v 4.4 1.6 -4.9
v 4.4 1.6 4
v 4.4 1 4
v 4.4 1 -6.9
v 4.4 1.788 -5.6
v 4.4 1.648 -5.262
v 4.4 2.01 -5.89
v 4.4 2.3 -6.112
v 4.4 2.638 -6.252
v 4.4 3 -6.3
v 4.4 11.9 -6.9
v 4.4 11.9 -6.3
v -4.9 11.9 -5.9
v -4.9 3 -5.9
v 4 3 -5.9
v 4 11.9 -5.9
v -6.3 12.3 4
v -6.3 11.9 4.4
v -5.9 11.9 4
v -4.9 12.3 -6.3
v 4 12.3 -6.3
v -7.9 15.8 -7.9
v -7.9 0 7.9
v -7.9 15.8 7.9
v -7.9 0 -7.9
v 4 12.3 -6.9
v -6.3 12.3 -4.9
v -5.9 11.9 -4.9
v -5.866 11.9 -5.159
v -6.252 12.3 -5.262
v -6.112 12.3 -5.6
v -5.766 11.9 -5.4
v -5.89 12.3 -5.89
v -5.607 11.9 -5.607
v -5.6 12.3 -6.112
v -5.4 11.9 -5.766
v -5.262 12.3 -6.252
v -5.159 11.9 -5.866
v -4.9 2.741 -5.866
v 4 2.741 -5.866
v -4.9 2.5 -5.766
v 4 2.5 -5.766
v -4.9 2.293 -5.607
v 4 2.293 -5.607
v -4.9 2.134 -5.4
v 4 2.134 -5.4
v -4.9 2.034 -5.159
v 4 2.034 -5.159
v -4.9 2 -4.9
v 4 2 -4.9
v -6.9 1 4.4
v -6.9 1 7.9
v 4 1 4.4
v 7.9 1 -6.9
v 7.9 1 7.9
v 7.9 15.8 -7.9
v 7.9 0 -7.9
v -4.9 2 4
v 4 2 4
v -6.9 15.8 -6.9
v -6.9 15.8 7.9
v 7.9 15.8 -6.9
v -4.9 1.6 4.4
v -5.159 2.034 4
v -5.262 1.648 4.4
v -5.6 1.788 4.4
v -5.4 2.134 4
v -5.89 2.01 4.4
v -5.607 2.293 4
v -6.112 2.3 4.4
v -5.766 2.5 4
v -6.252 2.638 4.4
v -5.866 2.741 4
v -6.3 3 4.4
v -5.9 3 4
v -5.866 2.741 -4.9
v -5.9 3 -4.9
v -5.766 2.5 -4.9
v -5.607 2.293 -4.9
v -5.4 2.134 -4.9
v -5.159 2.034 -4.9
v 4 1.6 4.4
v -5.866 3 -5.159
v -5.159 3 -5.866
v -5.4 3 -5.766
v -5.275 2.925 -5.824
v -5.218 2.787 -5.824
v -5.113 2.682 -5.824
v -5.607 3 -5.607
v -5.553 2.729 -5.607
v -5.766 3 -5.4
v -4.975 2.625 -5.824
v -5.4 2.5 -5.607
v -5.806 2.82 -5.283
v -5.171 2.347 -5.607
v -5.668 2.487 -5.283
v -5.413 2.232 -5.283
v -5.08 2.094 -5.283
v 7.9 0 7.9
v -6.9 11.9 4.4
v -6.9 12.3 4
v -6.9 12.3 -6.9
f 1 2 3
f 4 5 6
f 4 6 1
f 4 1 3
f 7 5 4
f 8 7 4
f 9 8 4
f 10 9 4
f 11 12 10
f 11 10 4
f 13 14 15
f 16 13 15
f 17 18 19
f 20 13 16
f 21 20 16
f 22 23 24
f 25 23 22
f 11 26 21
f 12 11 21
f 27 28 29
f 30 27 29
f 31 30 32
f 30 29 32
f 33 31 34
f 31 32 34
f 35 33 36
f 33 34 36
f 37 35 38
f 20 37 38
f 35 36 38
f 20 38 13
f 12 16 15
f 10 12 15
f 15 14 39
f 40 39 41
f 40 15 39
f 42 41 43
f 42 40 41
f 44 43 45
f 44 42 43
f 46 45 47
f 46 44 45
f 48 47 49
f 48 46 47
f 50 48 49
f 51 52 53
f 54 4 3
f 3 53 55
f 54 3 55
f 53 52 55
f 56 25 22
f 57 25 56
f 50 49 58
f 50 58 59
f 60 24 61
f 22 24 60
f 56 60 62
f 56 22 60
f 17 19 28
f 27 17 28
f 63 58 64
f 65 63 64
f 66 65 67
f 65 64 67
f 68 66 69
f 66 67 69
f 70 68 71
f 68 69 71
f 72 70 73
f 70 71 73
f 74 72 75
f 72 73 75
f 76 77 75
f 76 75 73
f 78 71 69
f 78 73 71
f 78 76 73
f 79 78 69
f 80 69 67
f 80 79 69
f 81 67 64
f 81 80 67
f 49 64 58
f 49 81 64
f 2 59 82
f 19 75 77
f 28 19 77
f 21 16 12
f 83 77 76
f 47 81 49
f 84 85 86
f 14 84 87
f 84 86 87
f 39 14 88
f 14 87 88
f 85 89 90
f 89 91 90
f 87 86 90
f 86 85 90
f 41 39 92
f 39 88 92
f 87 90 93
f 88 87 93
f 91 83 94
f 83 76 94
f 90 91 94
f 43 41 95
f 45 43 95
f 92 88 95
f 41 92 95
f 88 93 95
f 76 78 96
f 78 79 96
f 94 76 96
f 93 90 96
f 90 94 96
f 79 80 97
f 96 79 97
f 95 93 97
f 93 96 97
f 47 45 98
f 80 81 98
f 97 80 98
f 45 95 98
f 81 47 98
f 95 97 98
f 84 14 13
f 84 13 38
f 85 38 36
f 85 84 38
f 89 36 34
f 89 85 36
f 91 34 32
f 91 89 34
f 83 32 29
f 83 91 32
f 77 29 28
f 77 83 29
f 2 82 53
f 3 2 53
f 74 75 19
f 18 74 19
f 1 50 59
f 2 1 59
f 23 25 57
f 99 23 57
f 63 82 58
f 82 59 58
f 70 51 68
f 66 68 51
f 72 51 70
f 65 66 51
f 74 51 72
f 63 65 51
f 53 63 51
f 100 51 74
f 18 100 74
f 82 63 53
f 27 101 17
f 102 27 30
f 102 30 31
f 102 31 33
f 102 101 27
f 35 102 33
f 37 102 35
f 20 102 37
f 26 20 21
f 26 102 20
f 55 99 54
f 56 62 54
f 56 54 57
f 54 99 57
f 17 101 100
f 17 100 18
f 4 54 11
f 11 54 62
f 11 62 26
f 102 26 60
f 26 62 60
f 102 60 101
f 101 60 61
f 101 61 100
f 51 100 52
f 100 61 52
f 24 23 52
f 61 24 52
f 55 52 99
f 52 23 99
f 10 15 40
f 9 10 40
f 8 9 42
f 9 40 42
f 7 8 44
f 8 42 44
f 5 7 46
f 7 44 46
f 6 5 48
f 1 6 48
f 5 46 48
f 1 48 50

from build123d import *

# Parameters (mm, degrees)
ESQUISSE1_W                  = 15.8
ESQUISSE1_H                  = 15.8
BOSS_EXTRU_1_DEPTH           = 15.8
COQUE1_T                     = -2
ENL_V_MAT_EXTRU_1_DEPTH      = 3.5
ENL_V_MAT_EXTRU_2_DEPTH      = 3.5
ENL_V_MAT_EXTRU_3_DEPTH      = 24.7
ENL_V_MAT_EXTRU_3_DEPTH_BACK = 3.5
CONG_1_R                     = 1
CHANFREIN1_SIZE              = 0.4


with BuildPart() as part:
    # Esquisse1 → Boss.-Extru.1 (new body)
    with BuildSketch(Plane(origin=(0, 0, 0), x_dir=(1, 0, 0), z_dir=(0, 1, 0))):
        Rectangle(ESQUISSE1_W, ESQUISSE1_H)
    extrude(amount=BOSS_EXTRU_1_DEPTH)

    # Coque1
    coque1_openings = [part.faces().sort_by_distance(p)[0] for p in [
        (0, 15.8, 0),
        (0, 7.9, 7.9),
        (7.9, 7.9, 0),
    ]]
    offset(amount=COQUE1_T, openings=coque1_openings, kind=Kind.INTERSECTION)

    # Esquisse2 → Enlèv. mat.-Extru.1 (cut)
    with BuildSketch(Plane.XY.offset(7.9)):
        Polygon((-5.9, 15.8), (-6.9, 15.8), (-6.9, 1), (7.9, 1), (7.9, 2), (-5.9, 2), align=None)
    extrude(amount=-ENL_V_MAT_EXTRU_1_DEPTH, mode=Mode.SUBTRACT)

    # Esquisse6 → Enlèv. mat.-Extru.2 (cut)
    with BuildSketch(Plane(origin=(0, 15.8, 0), x_dir=(1, 0, 0), z_dir=(0, 1, 0))):
        Polygon((-5.9, -4.4), (-5.9, 5.9), (7.9, 5.9), (7.9, 6.9), (-6.9, 6.9), (-6.9, -4.4), align=None)
    extrude(amount=-ENL_V_MAT_EXTRU_2_DEPTH, mode=Mode.SUBTRACT)

    # Esquisse7 → Enlèv. mat.-Extru.3 (cut, two sides: drawn at the far end of the back side and taken through both)
    with BuildSketch(Plane(origin=(7.9, 0, 0), x_dir=(0, 0, -1), z_dir=(1, 0, 0)).offset(-ENL_V_MAT_EXTRU_3_DEPTH_BACK)):
        Polygon((5.9, 2), (-4.4, 2), (-4.4, 1), (6.9, 1), (6.9, 12.3), (5.9, 12.3), align=None)
    extrude(amount=ENL_V_MAT_EXTRU_3_DEPTH + ENL_V_MAT_EXTRU_3_DEPTH_BACK, mode=Mode.SUBTRACT)

    # Congé1
    cong_1_edges = [part.edges().sort_by_distance(p)[0] for p in [
        (-5.9, 2, -0.75),
        (-5.9, 7.15, -5.9),
        (-0.75, 2, -5.9),
    ]]
    fillet(cong_1_edges, radius=CONG_1_R)

    # Chanfrein1
    chanfrein1_edges = [part.edges().sort_by_distance(p)[0] for p in [
        (-5.9, 7.65, 4.4),
        (-6.4, 12.3, 4.4),
        (-5.9, 12.3, -0.25),
        (-0.25, 2, 4.4),
        (4.4, 2, -0.25),
        (4.4, 12.3, -6.4),
        (4.4, 1.5, 4.4),
        (4.4, 7.65, -5.9),
        (-0.25, 12.3, -5.9),
        (-5.607106781, 12.3, -5.607106781),
        (4.4, 2.292893219, -5.607106781),
        (-5.607106781, 2.292893219, 4.4),
    ]]
    chamfer(chanfrein1_edges, length=CHANFREIN1_SIZE)


solid = part.part
